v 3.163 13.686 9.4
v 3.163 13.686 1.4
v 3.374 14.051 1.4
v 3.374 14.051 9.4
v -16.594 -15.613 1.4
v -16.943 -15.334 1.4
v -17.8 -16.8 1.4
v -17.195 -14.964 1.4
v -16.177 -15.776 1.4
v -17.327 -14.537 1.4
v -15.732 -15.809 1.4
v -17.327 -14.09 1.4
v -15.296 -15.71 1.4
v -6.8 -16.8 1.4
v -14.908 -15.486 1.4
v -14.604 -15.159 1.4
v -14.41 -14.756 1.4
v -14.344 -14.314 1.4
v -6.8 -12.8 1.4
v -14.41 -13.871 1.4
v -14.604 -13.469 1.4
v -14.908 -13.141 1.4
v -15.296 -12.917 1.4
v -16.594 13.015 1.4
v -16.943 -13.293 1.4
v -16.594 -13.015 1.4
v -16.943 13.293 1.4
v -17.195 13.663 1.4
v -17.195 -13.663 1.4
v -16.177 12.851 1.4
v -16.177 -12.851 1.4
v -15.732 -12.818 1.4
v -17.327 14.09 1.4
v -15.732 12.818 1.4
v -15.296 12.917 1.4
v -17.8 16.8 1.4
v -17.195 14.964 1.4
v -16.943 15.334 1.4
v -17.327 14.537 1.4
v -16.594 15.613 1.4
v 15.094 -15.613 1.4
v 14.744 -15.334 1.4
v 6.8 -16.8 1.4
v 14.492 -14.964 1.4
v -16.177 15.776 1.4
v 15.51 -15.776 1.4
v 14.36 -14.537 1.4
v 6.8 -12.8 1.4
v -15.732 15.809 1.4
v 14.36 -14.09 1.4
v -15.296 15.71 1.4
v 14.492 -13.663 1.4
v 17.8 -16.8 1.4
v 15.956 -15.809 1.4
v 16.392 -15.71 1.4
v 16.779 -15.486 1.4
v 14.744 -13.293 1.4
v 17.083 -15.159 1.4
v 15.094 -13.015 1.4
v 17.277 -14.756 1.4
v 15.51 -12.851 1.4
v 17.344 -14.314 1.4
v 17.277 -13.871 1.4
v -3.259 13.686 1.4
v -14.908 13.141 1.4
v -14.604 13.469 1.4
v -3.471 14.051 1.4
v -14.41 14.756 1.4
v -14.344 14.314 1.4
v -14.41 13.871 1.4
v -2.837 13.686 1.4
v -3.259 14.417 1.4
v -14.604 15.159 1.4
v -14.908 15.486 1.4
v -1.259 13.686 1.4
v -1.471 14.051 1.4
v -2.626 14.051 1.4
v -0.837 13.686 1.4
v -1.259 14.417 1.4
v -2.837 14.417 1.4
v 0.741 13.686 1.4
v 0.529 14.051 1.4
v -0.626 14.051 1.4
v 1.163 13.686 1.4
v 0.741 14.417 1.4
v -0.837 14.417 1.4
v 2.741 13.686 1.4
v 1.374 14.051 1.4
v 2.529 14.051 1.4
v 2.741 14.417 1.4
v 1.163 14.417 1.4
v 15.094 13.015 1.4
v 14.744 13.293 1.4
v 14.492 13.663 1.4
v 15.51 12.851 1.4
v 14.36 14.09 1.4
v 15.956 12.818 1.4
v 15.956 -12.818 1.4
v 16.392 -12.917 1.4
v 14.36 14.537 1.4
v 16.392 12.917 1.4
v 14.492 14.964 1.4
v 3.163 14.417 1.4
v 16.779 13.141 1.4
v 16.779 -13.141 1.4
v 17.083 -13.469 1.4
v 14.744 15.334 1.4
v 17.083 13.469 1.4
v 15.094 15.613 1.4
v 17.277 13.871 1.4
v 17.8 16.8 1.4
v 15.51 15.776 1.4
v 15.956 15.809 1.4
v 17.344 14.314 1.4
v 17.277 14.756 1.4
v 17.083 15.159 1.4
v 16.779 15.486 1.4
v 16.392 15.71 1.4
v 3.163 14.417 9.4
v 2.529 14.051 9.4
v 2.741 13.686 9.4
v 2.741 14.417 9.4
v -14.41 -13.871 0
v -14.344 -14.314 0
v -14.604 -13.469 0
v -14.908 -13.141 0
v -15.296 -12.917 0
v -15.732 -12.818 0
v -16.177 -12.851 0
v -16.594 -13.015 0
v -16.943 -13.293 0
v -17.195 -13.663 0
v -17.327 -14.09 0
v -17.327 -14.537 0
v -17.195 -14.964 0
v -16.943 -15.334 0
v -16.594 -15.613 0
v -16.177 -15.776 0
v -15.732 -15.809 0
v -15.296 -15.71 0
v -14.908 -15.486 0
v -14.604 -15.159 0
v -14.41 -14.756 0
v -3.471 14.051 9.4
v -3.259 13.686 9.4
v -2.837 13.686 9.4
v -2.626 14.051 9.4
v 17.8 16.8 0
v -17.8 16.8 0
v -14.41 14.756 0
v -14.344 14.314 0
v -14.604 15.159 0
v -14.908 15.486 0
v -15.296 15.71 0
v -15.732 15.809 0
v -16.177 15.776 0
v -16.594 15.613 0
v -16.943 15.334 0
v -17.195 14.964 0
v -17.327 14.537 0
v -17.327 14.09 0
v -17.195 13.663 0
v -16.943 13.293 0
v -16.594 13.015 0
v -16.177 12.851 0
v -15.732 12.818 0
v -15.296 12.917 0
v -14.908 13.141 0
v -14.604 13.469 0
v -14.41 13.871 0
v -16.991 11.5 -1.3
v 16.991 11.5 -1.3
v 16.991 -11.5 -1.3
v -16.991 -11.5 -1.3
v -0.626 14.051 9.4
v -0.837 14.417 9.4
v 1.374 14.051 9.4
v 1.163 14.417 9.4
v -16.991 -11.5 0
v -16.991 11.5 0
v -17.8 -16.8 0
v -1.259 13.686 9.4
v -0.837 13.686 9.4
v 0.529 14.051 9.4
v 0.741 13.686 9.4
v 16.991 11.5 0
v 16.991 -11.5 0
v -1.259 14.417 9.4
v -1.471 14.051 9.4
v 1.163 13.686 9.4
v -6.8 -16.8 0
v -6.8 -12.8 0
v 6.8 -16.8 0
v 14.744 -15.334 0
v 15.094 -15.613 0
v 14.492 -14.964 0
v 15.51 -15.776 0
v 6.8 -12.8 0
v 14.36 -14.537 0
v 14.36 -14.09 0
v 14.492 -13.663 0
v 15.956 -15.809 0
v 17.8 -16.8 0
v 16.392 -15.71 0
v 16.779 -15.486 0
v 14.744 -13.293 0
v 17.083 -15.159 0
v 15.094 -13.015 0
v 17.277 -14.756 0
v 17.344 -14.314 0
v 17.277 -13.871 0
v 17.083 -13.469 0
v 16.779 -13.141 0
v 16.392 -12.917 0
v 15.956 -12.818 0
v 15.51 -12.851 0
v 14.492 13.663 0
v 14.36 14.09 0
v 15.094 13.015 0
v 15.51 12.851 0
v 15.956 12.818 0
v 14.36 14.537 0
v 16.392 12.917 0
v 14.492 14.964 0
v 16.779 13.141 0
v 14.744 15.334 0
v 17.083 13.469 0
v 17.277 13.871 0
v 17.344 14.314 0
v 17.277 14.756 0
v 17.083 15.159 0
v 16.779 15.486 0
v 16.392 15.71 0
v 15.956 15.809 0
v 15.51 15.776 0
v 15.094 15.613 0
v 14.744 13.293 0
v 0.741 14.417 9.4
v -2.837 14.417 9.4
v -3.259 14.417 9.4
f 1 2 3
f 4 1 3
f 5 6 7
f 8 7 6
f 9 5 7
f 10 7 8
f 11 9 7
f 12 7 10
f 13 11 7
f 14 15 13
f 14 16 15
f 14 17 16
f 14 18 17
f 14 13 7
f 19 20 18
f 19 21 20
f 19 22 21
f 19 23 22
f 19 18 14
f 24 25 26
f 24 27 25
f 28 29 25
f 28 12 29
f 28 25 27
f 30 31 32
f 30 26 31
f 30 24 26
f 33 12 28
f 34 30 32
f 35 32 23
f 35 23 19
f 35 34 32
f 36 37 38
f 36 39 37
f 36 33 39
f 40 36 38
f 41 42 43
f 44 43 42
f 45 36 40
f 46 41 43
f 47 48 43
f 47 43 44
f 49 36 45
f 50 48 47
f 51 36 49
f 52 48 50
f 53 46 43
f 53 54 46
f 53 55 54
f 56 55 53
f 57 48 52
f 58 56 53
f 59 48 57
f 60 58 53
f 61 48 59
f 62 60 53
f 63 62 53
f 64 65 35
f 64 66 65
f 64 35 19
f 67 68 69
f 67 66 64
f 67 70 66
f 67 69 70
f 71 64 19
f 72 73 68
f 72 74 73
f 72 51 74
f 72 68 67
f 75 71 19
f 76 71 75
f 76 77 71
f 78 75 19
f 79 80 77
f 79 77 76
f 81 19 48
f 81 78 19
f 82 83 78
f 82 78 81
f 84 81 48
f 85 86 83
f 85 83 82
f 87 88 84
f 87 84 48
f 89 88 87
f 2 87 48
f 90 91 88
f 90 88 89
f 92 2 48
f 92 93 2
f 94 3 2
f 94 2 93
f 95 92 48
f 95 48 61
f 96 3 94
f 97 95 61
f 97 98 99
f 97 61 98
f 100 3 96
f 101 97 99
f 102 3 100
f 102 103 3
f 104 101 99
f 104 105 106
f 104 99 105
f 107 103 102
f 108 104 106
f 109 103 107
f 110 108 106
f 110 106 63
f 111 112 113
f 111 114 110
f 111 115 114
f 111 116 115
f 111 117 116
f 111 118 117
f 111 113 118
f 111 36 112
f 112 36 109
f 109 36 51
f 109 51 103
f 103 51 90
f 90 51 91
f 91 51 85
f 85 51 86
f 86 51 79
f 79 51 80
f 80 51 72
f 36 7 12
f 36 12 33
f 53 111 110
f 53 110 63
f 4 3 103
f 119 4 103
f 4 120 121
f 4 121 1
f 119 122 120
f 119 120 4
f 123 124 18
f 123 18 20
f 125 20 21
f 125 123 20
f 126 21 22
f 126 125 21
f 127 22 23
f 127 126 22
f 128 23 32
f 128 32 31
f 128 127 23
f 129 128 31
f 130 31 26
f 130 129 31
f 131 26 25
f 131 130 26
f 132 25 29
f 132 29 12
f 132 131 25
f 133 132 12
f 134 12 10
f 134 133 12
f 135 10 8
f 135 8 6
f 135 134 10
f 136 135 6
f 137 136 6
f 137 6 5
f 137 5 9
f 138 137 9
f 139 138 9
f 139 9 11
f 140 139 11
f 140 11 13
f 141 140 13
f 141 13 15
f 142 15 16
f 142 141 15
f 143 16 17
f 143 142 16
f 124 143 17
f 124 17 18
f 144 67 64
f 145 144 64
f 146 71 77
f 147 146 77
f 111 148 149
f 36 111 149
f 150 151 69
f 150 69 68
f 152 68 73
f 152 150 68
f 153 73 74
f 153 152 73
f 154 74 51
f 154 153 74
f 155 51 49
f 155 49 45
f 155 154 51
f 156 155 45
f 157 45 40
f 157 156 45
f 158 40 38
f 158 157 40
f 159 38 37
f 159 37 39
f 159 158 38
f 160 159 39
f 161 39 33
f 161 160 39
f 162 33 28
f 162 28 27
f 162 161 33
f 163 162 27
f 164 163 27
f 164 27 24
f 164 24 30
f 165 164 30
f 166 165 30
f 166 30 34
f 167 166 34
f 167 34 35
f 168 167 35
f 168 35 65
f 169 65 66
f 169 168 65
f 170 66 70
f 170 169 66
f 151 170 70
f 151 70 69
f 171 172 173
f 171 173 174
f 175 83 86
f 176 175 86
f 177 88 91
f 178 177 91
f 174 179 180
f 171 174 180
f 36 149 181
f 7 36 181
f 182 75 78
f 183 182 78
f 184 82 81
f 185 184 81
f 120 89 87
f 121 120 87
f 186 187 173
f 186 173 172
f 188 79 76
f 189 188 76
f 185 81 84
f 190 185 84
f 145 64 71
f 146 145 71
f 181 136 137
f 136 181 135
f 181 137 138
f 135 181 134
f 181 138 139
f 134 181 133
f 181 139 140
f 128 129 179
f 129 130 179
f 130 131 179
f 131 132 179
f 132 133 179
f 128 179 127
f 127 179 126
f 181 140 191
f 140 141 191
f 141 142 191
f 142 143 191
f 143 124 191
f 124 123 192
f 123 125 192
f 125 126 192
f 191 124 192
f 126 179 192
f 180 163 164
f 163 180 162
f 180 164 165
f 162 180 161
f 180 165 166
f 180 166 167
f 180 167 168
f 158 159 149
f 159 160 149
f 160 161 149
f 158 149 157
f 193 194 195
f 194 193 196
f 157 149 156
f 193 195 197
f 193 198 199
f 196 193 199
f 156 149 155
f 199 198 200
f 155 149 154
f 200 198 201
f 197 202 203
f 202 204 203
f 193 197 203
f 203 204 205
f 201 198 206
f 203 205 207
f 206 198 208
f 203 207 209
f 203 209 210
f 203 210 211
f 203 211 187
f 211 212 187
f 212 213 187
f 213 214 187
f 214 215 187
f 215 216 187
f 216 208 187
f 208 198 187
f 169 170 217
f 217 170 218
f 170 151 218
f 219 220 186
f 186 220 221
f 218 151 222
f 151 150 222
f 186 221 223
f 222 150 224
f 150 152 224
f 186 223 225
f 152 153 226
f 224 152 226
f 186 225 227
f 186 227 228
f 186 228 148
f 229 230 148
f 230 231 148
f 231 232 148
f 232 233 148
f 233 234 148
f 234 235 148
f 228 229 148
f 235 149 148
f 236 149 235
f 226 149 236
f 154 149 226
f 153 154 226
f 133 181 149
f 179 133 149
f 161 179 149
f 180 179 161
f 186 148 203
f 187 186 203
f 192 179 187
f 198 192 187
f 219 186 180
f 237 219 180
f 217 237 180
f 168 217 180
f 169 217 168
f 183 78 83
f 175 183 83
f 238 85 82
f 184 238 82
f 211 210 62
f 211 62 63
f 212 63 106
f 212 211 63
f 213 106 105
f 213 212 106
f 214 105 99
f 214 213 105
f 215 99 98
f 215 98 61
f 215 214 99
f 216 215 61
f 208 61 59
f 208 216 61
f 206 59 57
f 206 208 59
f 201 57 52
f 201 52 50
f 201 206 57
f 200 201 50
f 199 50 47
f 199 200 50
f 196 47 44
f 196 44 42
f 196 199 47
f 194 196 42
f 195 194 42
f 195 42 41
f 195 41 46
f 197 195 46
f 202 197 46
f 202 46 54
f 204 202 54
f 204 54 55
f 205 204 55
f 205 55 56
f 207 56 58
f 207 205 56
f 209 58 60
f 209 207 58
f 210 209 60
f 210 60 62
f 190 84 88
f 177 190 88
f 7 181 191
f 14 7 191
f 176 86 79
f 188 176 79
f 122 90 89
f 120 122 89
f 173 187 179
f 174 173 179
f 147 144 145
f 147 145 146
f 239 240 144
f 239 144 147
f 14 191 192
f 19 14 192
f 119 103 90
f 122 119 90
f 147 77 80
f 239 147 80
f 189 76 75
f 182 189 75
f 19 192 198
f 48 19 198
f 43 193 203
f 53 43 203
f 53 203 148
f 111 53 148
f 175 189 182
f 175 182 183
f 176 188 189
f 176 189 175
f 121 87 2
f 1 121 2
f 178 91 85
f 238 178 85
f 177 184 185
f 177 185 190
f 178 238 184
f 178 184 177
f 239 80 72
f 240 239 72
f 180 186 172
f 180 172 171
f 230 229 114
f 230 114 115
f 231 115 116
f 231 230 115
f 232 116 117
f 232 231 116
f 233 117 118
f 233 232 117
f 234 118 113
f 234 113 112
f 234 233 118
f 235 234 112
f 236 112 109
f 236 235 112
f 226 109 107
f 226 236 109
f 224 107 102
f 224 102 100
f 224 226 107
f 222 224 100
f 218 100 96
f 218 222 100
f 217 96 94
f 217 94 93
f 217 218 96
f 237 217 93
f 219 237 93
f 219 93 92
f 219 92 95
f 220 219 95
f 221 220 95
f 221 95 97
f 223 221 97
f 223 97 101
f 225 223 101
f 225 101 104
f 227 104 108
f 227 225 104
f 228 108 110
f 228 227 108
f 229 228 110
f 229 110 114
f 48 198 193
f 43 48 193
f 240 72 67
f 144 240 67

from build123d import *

# Parameters (mm, degrees)
SKETCH1_R           = 1.5
BOSS_EXTRUDE1_DEPTH = 1.4
SKETCH2_W           = 33.982309018
SKETCH2_H           = 23
BOSS_EXTRUDE2_DEPTH = 1.3
BOSS_EXTRUDE3_DEPTH = 8


with BuildPart() as part:
    # Sketch1 → Boss-Extrude1 (new body)
    with BuildSketch(Plane.XY):
        Polygon((17.8, 16.8), (-17.8, 16.8), (-17.8, -16.8), (-6.8, -16.8), (-6.8, -12.8), (6.8, -12.8), (6.8, -16.8), (17.8, -16.8), align=None)
        with Locations((-15.843700026, -14.313574824)):
            Circle(SKETCH1_R, mode=Mode.SUBTRACT)
        with Locations((15.843700026, -14.313574824)):
            Circle(SKETCH1_R, mode=Mode.SUBTRACT)
        with Locations((-15.843700026, 14.313574824)):
            Circle(SKETCH1_R, mode=Mode.SUBTRACT)
        with Locations((15.843700026, 14.313574824)):
            Circle(SKETCH1_R, mode=Mode.SUBTRACT)
    extrude(amount=BOSS_EXTRUDE1_DEPTH)

    # Sketch2 → Boss-Extrude2 (add)
    with BuildSketch(Plane(origin=(0, 0, 0), x_dir=(-1, 0, 0), z_dir=(0, 0, -1))):
        Rectangle(SKETCH2_W, SKETCH2_H)
    extrude(amount=BOSS_EXTRUDE2_DEPTH)

    # Sketch3 → Boss-Extrude3 (add)
    with BuildSketch(Plane.XY.offset(1.4)):
        Polygon((-0.625701938, 14.051390723), (-0.836940095, 14.417265944), (-1.259416409, 14.417265944), (-1.470654566, 14.051390723), (-1.259416409, 13.685515503), (-0.836940095, 13.685515503), align=None)
        Polygon((-2.625701938, 14.051390723), (-2.836940095, 14.417265944), (-3.259416409, 14.417265944), (-3.470654566, 14.051390723), (-3.259416409, 13.685515503), (-2.836940095, 13.685515503), align=None)
        Polygon((1.374298062, 14.051390723), (1.163059905, 14.417265944), (0.740583591, 14.417265944), (0.529345434, 14.051390723), (0.740583591, 13.685515503), (1.163059905, 13.685515503), align=None)
        Polygon((3.374298062, 14.051390723), (3.163059905, 14.417265944), (2.740583591, 14.417265944), (2.529345434, 14.051390723), (2.740583591, 13.685515503), (3.163059905, 13.685515503), align=None)
    extrude(amount=BOSS_EXTRUDE3_DEPTH)


solid = part.part
